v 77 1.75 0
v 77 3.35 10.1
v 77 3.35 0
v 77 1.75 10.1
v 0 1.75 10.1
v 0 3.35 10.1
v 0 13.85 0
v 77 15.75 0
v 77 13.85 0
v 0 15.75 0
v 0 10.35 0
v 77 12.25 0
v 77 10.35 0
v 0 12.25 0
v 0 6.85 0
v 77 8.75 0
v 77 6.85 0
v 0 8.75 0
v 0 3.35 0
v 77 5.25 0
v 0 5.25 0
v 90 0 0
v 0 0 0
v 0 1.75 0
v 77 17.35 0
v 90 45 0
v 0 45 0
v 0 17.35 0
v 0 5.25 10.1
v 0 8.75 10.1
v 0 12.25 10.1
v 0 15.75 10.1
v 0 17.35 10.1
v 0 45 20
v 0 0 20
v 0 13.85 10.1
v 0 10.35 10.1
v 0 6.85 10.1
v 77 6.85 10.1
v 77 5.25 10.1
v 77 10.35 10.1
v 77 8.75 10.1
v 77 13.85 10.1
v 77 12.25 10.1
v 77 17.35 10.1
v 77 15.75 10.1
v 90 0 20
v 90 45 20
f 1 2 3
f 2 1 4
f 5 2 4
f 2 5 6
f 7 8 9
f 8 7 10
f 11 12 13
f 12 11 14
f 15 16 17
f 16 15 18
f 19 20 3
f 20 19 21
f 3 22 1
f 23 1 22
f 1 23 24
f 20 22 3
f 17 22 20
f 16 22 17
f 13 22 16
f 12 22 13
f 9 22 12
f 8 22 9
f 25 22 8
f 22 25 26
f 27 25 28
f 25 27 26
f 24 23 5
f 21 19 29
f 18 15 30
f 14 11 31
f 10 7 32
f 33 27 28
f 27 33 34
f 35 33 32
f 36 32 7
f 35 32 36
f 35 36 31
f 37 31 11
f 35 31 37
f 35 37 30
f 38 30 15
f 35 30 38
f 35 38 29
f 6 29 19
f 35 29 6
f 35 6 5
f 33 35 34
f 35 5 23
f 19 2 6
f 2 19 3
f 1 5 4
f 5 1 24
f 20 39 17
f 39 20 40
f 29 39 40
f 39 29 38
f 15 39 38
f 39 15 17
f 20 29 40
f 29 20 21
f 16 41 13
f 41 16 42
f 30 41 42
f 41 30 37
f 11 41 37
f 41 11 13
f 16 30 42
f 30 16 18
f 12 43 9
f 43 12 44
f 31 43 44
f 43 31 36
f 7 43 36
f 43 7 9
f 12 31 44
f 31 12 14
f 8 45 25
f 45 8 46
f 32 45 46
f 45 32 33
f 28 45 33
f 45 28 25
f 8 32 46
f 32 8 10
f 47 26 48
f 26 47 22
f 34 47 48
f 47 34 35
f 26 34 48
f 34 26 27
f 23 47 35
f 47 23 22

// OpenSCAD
// Drying rack for 10 microscope slides.
// Base: 90 x 45 x 20 mm.
// Slots: 10 parallel slots along X, 77 mm long, 1.6 mm wide, 10 mm deep.
// Spacing: 3.5 mm centre-to-centre, centred on the block.

// Dimensions
L_base = 90;
W_base = 45;
H_base = 20;

L_slot = 77;
W_slot = 1.6;
D_slot = 10;

N_slots = 10;
P_spacing = 3.5;

$fn = 64;

// Calculate slot positions to centre the group in Y
// The first slot is at -(N_slots-1)/2 * P_spacing
// The i-th slot (0 to N_slots-1) is at i * P_spacing relative to the first
// Then shift the whole group so the centre is at 0.
// Group centre offset = - (N_slots - 1) / 2 * P_spacing
group_offset = - (N_slots - 1) / 2 * P_spacing;

difference() {
    // Main block
    translate([0, 0, 0]) cube([L_base, W_base, H_base]);

    // Cut slots
    for (i = [0 : N_slots - 1]) {
        // Calculate Y position for this slot
        y_pos = i * P_spacing + group_offset;
        
        // Slot geometry: runs along X, width in Y, depth in Z
        // Slot is open at top (Z=H_base), so we cut from Z=0 up to Z=D_slot
        // To ensure clean cut, extend slightly past the top face
        translate([0, y_pos, 0]) 
            cube([L_slot, W_slot, D_slot + 0.1]);
    }
}
